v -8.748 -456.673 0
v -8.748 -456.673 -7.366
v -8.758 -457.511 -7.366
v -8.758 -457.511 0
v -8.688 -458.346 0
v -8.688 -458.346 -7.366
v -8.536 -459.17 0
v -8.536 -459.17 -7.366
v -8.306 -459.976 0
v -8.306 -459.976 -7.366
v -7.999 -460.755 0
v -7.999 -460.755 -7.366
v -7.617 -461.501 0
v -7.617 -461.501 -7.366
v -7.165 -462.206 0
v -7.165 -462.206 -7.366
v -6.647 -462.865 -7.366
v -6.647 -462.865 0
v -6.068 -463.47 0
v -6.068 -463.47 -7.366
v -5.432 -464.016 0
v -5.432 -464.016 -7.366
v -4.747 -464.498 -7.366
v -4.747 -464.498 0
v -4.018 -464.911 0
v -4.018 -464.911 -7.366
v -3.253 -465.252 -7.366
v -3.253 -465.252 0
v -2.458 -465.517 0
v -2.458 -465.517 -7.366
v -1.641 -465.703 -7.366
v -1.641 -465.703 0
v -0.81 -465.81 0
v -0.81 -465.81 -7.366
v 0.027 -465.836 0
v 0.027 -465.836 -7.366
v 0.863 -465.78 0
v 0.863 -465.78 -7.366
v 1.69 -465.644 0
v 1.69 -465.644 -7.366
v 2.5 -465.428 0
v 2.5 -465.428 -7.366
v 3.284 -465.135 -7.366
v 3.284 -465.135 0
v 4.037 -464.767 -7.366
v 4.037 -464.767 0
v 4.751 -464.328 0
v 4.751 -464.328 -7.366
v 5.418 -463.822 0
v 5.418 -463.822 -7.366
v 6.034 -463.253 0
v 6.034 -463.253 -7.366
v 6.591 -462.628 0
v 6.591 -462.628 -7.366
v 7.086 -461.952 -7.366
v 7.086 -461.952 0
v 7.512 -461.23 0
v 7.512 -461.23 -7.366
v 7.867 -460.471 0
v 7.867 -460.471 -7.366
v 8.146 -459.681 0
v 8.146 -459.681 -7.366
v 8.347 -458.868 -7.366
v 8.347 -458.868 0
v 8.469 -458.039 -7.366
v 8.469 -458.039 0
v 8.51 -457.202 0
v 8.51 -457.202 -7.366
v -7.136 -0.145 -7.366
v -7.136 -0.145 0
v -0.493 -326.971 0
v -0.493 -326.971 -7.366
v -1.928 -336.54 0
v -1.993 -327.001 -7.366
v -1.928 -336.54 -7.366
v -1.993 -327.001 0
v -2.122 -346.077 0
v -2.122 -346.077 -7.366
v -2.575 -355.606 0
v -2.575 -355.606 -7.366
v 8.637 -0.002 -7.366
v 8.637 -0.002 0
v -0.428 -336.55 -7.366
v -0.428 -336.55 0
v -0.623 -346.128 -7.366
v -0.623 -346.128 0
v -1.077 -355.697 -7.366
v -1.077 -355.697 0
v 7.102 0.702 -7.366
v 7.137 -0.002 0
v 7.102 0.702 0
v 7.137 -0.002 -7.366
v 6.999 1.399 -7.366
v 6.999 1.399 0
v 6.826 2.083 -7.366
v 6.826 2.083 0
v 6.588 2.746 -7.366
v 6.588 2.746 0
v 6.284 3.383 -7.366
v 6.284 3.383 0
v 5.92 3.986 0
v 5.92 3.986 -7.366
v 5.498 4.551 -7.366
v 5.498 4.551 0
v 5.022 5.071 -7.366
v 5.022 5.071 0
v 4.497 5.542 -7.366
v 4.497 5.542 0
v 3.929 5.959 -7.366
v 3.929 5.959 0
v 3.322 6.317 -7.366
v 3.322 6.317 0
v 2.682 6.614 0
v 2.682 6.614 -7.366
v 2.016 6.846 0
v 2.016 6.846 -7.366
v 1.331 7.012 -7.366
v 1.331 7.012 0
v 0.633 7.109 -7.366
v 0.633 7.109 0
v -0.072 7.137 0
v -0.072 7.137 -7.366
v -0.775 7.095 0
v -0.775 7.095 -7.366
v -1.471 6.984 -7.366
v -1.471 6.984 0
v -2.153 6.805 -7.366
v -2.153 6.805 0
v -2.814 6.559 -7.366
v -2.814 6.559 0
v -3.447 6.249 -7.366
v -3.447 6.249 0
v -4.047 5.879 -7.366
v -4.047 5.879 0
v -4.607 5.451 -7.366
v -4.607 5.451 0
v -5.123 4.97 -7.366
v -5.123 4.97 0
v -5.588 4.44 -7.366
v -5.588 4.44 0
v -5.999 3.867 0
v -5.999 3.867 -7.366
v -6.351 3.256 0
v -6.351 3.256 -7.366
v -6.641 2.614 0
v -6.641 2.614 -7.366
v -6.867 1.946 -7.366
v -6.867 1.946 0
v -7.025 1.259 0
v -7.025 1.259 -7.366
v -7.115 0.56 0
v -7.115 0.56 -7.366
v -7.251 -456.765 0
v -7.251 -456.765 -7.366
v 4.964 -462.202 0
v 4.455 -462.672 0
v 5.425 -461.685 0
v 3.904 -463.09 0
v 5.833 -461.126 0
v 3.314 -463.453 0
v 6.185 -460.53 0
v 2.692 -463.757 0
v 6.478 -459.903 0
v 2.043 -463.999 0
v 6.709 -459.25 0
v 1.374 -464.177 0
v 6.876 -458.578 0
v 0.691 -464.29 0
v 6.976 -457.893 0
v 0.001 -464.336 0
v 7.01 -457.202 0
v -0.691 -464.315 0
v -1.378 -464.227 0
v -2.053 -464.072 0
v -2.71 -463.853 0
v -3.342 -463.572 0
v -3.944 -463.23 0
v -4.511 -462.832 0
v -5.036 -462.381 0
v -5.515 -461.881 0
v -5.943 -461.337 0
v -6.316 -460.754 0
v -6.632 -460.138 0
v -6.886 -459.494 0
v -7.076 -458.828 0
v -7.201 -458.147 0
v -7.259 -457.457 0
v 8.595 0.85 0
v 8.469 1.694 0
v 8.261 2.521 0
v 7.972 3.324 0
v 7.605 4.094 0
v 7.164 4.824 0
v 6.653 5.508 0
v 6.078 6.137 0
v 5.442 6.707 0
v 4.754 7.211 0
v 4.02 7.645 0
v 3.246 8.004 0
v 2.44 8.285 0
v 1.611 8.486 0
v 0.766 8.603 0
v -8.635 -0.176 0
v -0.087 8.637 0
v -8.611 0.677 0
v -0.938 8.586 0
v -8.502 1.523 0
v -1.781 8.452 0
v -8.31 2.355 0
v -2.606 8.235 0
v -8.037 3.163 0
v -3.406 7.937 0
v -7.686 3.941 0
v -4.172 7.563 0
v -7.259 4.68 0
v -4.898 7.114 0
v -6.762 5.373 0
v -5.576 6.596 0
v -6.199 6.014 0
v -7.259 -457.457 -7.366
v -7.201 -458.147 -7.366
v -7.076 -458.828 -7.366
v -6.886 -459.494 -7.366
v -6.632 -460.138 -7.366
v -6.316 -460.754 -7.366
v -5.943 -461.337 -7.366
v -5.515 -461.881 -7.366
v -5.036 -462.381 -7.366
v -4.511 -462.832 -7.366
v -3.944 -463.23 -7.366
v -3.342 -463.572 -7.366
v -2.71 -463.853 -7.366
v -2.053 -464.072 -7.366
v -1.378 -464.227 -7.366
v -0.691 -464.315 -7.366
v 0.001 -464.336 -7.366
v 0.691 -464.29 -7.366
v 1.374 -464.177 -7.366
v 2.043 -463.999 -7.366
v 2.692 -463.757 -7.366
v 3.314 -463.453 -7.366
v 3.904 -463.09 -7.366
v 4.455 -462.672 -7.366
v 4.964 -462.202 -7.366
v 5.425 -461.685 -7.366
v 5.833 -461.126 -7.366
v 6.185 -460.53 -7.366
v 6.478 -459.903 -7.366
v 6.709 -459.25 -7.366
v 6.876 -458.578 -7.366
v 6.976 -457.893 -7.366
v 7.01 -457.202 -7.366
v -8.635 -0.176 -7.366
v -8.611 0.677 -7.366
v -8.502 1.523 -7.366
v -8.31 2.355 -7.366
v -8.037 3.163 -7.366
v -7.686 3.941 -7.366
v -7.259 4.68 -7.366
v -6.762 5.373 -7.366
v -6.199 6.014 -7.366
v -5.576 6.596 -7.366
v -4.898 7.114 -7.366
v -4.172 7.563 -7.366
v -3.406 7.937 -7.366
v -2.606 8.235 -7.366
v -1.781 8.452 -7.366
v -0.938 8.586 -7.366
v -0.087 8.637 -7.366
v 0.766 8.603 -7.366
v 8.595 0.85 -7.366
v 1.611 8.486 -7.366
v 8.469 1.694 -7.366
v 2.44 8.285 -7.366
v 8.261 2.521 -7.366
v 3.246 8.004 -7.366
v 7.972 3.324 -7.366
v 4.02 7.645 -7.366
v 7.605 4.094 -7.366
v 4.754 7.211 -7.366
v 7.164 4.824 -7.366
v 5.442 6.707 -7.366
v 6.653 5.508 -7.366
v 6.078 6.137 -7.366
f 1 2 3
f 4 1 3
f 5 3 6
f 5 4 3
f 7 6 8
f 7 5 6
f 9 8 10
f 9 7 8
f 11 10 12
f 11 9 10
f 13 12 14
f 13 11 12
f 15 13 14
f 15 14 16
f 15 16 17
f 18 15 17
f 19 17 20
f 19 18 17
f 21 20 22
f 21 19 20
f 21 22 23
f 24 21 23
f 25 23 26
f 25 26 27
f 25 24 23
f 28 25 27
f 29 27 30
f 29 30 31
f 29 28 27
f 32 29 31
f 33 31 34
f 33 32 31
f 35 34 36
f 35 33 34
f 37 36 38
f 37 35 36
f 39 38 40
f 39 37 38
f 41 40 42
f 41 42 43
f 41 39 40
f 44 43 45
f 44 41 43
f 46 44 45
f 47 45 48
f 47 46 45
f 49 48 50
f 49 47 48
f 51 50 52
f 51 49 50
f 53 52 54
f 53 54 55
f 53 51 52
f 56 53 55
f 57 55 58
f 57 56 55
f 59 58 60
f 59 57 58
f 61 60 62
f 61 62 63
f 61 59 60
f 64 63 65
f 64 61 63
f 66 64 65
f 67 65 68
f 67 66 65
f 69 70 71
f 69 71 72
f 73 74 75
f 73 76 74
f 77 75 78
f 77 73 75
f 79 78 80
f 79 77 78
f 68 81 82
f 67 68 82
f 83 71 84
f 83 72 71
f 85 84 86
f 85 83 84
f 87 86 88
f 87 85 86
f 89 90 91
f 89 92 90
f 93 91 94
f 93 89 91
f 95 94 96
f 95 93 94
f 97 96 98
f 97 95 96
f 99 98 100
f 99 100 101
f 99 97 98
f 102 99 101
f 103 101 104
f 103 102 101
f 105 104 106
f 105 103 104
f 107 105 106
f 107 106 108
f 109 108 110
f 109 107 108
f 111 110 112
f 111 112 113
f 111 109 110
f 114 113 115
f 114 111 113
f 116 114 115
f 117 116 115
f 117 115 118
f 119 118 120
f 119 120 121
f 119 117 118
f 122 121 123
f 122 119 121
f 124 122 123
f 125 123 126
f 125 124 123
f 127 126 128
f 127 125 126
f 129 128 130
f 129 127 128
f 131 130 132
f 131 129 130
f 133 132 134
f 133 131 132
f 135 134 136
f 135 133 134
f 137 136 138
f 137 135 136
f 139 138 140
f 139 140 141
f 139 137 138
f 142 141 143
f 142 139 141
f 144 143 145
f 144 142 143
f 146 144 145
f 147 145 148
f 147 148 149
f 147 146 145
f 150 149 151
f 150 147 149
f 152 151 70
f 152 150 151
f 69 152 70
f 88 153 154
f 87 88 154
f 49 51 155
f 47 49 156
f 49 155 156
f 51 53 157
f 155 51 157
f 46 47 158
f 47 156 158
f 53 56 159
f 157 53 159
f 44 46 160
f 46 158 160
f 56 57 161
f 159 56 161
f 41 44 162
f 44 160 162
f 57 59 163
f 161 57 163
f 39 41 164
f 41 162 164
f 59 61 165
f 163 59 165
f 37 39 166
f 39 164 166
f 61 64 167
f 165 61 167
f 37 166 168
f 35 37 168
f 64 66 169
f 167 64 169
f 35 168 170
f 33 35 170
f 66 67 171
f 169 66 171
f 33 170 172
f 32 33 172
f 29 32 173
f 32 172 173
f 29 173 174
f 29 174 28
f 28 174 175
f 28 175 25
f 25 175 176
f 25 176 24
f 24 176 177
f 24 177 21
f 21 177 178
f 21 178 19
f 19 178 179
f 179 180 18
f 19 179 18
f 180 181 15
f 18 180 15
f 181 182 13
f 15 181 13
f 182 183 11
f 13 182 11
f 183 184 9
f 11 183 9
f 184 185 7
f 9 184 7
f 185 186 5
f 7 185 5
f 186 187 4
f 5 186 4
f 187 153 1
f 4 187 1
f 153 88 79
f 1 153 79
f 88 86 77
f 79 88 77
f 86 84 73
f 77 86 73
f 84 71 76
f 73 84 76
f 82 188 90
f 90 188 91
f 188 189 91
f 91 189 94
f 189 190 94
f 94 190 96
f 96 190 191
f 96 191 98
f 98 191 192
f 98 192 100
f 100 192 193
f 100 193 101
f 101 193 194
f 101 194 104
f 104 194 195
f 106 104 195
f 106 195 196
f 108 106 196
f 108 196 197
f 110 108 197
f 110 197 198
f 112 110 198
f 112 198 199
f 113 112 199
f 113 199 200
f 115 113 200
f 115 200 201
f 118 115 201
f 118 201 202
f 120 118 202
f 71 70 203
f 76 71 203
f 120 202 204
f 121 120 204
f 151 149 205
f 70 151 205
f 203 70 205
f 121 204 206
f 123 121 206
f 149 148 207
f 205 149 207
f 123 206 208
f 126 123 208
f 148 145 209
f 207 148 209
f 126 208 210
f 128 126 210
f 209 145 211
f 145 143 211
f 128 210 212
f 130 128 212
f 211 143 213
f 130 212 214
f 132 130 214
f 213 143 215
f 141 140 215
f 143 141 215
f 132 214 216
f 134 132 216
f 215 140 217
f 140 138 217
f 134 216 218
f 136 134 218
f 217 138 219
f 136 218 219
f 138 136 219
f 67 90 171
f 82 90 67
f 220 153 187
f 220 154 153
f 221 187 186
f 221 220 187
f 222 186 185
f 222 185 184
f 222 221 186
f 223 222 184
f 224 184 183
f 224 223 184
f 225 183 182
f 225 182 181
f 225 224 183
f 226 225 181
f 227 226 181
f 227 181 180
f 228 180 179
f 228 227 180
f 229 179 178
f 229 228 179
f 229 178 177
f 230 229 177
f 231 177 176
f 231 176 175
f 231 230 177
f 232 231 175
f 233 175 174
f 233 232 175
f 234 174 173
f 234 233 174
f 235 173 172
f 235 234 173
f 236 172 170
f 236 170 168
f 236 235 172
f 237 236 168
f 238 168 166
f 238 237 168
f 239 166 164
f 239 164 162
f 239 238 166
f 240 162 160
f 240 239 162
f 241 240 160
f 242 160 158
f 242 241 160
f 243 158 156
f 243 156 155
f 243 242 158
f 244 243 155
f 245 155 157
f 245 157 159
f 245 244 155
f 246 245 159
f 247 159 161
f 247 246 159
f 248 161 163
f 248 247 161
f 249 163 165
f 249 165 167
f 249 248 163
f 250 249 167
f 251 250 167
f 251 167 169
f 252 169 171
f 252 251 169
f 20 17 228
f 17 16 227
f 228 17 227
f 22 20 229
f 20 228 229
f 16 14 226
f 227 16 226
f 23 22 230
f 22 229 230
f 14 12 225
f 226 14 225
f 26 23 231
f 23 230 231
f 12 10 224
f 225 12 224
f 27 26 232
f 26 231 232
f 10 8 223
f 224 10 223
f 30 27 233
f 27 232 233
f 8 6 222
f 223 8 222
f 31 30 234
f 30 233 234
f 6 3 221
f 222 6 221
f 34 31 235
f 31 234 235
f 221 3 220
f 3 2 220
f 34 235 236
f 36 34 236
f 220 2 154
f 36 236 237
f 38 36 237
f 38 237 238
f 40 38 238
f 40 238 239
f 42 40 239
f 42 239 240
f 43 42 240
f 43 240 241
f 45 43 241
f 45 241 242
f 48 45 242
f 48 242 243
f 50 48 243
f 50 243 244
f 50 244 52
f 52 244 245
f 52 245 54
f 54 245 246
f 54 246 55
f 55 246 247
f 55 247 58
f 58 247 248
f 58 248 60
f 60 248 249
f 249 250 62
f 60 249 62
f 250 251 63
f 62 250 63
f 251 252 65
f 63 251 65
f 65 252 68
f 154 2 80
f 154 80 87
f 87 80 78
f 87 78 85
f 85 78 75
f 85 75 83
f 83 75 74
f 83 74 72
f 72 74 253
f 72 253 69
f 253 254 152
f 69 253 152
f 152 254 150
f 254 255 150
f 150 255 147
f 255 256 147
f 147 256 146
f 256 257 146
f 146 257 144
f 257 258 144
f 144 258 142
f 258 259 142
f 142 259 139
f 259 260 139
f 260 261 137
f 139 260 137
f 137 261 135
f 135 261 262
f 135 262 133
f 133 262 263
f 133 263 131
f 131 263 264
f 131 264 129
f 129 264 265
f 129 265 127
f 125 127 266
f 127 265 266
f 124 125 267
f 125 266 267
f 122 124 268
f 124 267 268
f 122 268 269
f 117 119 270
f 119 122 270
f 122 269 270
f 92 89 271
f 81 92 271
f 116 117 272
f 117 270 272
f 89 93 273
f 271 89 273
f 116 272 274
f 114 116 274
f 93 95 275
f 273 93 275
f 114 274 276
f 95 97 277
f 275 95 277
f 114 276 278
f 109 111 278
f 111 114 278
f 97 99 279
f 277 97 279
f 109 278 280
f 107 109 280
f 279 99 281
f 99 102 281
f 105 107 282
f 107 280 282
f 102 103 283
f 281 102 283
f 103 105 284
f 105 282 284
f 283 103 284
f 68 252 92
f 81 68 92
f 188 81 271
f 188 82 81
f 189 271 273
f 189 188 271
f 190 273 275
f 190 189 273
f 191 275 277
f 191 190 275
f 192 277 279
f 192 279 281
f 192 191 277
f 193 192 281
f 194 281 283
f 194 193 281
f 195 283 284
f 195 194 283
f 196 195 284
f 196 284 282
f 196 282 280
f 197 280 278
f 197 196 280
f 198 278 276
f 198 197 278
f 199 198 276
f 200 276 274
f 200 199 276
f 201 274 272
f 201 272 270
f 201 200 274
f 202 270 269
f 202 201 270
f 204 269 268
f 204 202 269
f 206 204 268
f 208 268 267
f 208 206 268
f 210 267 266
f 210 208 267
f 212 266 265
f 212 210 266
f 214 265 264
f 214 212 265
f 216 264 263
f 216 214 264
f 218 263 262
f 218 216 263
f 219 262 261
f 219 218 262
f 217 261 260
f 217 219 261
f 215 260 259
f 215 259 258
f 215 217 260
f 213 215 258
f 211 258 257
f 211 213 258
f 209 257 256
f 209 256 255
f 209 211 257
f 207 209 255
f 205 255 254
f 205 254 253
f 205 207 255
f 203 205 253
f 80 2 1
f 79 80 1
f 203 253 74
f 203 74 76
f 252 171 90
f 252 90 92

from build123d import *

# Parameters (mm, degrees)
SKETCH3_W = 7.366
SKETCH3_H = 1.5


with BuildPart() as part:
    # Sweep1: sweep along a path in Sketch2
    with BuildLine(Plane.XY) as sweep1_path:
        Line((7.091056719, -457.202005016), (7.218056719, -0.002005016))
        ThreePointArc((7.218056719, -0.002005016), (-0.072338406, 7.217694506), (-7.216566601, -0.146674154))
        Line((-7.216566601, -0.146674154), (-0.57395254, -326.972262728))
        ThreePointArc((-0.57395254, -326.972262728), (-0.574097453, -341.338325894), (-1.158260966, -355.692507303))
        Line((-1.158260966, -355.692507303), (-7.331629374, -456.759929099))
        ThreePointArc((-7.331629374, -456.759929099), (-0.348139893, -464.414668667), (7.091056719, -457.202005016))
    # Sketch3 → Sweep1 (sweep)
    with BuildSketch(Plane(origin=(0, 0, 0), x_dir=(0, 0, -1), z_dir=(1, 0, 0))):
        with Locations((3.683, 7.887099691)):
            Rectangle(SKETCH3_W, SKETCH3_H)
    sweep(path=sweep1_path.line)


solid = part.part
